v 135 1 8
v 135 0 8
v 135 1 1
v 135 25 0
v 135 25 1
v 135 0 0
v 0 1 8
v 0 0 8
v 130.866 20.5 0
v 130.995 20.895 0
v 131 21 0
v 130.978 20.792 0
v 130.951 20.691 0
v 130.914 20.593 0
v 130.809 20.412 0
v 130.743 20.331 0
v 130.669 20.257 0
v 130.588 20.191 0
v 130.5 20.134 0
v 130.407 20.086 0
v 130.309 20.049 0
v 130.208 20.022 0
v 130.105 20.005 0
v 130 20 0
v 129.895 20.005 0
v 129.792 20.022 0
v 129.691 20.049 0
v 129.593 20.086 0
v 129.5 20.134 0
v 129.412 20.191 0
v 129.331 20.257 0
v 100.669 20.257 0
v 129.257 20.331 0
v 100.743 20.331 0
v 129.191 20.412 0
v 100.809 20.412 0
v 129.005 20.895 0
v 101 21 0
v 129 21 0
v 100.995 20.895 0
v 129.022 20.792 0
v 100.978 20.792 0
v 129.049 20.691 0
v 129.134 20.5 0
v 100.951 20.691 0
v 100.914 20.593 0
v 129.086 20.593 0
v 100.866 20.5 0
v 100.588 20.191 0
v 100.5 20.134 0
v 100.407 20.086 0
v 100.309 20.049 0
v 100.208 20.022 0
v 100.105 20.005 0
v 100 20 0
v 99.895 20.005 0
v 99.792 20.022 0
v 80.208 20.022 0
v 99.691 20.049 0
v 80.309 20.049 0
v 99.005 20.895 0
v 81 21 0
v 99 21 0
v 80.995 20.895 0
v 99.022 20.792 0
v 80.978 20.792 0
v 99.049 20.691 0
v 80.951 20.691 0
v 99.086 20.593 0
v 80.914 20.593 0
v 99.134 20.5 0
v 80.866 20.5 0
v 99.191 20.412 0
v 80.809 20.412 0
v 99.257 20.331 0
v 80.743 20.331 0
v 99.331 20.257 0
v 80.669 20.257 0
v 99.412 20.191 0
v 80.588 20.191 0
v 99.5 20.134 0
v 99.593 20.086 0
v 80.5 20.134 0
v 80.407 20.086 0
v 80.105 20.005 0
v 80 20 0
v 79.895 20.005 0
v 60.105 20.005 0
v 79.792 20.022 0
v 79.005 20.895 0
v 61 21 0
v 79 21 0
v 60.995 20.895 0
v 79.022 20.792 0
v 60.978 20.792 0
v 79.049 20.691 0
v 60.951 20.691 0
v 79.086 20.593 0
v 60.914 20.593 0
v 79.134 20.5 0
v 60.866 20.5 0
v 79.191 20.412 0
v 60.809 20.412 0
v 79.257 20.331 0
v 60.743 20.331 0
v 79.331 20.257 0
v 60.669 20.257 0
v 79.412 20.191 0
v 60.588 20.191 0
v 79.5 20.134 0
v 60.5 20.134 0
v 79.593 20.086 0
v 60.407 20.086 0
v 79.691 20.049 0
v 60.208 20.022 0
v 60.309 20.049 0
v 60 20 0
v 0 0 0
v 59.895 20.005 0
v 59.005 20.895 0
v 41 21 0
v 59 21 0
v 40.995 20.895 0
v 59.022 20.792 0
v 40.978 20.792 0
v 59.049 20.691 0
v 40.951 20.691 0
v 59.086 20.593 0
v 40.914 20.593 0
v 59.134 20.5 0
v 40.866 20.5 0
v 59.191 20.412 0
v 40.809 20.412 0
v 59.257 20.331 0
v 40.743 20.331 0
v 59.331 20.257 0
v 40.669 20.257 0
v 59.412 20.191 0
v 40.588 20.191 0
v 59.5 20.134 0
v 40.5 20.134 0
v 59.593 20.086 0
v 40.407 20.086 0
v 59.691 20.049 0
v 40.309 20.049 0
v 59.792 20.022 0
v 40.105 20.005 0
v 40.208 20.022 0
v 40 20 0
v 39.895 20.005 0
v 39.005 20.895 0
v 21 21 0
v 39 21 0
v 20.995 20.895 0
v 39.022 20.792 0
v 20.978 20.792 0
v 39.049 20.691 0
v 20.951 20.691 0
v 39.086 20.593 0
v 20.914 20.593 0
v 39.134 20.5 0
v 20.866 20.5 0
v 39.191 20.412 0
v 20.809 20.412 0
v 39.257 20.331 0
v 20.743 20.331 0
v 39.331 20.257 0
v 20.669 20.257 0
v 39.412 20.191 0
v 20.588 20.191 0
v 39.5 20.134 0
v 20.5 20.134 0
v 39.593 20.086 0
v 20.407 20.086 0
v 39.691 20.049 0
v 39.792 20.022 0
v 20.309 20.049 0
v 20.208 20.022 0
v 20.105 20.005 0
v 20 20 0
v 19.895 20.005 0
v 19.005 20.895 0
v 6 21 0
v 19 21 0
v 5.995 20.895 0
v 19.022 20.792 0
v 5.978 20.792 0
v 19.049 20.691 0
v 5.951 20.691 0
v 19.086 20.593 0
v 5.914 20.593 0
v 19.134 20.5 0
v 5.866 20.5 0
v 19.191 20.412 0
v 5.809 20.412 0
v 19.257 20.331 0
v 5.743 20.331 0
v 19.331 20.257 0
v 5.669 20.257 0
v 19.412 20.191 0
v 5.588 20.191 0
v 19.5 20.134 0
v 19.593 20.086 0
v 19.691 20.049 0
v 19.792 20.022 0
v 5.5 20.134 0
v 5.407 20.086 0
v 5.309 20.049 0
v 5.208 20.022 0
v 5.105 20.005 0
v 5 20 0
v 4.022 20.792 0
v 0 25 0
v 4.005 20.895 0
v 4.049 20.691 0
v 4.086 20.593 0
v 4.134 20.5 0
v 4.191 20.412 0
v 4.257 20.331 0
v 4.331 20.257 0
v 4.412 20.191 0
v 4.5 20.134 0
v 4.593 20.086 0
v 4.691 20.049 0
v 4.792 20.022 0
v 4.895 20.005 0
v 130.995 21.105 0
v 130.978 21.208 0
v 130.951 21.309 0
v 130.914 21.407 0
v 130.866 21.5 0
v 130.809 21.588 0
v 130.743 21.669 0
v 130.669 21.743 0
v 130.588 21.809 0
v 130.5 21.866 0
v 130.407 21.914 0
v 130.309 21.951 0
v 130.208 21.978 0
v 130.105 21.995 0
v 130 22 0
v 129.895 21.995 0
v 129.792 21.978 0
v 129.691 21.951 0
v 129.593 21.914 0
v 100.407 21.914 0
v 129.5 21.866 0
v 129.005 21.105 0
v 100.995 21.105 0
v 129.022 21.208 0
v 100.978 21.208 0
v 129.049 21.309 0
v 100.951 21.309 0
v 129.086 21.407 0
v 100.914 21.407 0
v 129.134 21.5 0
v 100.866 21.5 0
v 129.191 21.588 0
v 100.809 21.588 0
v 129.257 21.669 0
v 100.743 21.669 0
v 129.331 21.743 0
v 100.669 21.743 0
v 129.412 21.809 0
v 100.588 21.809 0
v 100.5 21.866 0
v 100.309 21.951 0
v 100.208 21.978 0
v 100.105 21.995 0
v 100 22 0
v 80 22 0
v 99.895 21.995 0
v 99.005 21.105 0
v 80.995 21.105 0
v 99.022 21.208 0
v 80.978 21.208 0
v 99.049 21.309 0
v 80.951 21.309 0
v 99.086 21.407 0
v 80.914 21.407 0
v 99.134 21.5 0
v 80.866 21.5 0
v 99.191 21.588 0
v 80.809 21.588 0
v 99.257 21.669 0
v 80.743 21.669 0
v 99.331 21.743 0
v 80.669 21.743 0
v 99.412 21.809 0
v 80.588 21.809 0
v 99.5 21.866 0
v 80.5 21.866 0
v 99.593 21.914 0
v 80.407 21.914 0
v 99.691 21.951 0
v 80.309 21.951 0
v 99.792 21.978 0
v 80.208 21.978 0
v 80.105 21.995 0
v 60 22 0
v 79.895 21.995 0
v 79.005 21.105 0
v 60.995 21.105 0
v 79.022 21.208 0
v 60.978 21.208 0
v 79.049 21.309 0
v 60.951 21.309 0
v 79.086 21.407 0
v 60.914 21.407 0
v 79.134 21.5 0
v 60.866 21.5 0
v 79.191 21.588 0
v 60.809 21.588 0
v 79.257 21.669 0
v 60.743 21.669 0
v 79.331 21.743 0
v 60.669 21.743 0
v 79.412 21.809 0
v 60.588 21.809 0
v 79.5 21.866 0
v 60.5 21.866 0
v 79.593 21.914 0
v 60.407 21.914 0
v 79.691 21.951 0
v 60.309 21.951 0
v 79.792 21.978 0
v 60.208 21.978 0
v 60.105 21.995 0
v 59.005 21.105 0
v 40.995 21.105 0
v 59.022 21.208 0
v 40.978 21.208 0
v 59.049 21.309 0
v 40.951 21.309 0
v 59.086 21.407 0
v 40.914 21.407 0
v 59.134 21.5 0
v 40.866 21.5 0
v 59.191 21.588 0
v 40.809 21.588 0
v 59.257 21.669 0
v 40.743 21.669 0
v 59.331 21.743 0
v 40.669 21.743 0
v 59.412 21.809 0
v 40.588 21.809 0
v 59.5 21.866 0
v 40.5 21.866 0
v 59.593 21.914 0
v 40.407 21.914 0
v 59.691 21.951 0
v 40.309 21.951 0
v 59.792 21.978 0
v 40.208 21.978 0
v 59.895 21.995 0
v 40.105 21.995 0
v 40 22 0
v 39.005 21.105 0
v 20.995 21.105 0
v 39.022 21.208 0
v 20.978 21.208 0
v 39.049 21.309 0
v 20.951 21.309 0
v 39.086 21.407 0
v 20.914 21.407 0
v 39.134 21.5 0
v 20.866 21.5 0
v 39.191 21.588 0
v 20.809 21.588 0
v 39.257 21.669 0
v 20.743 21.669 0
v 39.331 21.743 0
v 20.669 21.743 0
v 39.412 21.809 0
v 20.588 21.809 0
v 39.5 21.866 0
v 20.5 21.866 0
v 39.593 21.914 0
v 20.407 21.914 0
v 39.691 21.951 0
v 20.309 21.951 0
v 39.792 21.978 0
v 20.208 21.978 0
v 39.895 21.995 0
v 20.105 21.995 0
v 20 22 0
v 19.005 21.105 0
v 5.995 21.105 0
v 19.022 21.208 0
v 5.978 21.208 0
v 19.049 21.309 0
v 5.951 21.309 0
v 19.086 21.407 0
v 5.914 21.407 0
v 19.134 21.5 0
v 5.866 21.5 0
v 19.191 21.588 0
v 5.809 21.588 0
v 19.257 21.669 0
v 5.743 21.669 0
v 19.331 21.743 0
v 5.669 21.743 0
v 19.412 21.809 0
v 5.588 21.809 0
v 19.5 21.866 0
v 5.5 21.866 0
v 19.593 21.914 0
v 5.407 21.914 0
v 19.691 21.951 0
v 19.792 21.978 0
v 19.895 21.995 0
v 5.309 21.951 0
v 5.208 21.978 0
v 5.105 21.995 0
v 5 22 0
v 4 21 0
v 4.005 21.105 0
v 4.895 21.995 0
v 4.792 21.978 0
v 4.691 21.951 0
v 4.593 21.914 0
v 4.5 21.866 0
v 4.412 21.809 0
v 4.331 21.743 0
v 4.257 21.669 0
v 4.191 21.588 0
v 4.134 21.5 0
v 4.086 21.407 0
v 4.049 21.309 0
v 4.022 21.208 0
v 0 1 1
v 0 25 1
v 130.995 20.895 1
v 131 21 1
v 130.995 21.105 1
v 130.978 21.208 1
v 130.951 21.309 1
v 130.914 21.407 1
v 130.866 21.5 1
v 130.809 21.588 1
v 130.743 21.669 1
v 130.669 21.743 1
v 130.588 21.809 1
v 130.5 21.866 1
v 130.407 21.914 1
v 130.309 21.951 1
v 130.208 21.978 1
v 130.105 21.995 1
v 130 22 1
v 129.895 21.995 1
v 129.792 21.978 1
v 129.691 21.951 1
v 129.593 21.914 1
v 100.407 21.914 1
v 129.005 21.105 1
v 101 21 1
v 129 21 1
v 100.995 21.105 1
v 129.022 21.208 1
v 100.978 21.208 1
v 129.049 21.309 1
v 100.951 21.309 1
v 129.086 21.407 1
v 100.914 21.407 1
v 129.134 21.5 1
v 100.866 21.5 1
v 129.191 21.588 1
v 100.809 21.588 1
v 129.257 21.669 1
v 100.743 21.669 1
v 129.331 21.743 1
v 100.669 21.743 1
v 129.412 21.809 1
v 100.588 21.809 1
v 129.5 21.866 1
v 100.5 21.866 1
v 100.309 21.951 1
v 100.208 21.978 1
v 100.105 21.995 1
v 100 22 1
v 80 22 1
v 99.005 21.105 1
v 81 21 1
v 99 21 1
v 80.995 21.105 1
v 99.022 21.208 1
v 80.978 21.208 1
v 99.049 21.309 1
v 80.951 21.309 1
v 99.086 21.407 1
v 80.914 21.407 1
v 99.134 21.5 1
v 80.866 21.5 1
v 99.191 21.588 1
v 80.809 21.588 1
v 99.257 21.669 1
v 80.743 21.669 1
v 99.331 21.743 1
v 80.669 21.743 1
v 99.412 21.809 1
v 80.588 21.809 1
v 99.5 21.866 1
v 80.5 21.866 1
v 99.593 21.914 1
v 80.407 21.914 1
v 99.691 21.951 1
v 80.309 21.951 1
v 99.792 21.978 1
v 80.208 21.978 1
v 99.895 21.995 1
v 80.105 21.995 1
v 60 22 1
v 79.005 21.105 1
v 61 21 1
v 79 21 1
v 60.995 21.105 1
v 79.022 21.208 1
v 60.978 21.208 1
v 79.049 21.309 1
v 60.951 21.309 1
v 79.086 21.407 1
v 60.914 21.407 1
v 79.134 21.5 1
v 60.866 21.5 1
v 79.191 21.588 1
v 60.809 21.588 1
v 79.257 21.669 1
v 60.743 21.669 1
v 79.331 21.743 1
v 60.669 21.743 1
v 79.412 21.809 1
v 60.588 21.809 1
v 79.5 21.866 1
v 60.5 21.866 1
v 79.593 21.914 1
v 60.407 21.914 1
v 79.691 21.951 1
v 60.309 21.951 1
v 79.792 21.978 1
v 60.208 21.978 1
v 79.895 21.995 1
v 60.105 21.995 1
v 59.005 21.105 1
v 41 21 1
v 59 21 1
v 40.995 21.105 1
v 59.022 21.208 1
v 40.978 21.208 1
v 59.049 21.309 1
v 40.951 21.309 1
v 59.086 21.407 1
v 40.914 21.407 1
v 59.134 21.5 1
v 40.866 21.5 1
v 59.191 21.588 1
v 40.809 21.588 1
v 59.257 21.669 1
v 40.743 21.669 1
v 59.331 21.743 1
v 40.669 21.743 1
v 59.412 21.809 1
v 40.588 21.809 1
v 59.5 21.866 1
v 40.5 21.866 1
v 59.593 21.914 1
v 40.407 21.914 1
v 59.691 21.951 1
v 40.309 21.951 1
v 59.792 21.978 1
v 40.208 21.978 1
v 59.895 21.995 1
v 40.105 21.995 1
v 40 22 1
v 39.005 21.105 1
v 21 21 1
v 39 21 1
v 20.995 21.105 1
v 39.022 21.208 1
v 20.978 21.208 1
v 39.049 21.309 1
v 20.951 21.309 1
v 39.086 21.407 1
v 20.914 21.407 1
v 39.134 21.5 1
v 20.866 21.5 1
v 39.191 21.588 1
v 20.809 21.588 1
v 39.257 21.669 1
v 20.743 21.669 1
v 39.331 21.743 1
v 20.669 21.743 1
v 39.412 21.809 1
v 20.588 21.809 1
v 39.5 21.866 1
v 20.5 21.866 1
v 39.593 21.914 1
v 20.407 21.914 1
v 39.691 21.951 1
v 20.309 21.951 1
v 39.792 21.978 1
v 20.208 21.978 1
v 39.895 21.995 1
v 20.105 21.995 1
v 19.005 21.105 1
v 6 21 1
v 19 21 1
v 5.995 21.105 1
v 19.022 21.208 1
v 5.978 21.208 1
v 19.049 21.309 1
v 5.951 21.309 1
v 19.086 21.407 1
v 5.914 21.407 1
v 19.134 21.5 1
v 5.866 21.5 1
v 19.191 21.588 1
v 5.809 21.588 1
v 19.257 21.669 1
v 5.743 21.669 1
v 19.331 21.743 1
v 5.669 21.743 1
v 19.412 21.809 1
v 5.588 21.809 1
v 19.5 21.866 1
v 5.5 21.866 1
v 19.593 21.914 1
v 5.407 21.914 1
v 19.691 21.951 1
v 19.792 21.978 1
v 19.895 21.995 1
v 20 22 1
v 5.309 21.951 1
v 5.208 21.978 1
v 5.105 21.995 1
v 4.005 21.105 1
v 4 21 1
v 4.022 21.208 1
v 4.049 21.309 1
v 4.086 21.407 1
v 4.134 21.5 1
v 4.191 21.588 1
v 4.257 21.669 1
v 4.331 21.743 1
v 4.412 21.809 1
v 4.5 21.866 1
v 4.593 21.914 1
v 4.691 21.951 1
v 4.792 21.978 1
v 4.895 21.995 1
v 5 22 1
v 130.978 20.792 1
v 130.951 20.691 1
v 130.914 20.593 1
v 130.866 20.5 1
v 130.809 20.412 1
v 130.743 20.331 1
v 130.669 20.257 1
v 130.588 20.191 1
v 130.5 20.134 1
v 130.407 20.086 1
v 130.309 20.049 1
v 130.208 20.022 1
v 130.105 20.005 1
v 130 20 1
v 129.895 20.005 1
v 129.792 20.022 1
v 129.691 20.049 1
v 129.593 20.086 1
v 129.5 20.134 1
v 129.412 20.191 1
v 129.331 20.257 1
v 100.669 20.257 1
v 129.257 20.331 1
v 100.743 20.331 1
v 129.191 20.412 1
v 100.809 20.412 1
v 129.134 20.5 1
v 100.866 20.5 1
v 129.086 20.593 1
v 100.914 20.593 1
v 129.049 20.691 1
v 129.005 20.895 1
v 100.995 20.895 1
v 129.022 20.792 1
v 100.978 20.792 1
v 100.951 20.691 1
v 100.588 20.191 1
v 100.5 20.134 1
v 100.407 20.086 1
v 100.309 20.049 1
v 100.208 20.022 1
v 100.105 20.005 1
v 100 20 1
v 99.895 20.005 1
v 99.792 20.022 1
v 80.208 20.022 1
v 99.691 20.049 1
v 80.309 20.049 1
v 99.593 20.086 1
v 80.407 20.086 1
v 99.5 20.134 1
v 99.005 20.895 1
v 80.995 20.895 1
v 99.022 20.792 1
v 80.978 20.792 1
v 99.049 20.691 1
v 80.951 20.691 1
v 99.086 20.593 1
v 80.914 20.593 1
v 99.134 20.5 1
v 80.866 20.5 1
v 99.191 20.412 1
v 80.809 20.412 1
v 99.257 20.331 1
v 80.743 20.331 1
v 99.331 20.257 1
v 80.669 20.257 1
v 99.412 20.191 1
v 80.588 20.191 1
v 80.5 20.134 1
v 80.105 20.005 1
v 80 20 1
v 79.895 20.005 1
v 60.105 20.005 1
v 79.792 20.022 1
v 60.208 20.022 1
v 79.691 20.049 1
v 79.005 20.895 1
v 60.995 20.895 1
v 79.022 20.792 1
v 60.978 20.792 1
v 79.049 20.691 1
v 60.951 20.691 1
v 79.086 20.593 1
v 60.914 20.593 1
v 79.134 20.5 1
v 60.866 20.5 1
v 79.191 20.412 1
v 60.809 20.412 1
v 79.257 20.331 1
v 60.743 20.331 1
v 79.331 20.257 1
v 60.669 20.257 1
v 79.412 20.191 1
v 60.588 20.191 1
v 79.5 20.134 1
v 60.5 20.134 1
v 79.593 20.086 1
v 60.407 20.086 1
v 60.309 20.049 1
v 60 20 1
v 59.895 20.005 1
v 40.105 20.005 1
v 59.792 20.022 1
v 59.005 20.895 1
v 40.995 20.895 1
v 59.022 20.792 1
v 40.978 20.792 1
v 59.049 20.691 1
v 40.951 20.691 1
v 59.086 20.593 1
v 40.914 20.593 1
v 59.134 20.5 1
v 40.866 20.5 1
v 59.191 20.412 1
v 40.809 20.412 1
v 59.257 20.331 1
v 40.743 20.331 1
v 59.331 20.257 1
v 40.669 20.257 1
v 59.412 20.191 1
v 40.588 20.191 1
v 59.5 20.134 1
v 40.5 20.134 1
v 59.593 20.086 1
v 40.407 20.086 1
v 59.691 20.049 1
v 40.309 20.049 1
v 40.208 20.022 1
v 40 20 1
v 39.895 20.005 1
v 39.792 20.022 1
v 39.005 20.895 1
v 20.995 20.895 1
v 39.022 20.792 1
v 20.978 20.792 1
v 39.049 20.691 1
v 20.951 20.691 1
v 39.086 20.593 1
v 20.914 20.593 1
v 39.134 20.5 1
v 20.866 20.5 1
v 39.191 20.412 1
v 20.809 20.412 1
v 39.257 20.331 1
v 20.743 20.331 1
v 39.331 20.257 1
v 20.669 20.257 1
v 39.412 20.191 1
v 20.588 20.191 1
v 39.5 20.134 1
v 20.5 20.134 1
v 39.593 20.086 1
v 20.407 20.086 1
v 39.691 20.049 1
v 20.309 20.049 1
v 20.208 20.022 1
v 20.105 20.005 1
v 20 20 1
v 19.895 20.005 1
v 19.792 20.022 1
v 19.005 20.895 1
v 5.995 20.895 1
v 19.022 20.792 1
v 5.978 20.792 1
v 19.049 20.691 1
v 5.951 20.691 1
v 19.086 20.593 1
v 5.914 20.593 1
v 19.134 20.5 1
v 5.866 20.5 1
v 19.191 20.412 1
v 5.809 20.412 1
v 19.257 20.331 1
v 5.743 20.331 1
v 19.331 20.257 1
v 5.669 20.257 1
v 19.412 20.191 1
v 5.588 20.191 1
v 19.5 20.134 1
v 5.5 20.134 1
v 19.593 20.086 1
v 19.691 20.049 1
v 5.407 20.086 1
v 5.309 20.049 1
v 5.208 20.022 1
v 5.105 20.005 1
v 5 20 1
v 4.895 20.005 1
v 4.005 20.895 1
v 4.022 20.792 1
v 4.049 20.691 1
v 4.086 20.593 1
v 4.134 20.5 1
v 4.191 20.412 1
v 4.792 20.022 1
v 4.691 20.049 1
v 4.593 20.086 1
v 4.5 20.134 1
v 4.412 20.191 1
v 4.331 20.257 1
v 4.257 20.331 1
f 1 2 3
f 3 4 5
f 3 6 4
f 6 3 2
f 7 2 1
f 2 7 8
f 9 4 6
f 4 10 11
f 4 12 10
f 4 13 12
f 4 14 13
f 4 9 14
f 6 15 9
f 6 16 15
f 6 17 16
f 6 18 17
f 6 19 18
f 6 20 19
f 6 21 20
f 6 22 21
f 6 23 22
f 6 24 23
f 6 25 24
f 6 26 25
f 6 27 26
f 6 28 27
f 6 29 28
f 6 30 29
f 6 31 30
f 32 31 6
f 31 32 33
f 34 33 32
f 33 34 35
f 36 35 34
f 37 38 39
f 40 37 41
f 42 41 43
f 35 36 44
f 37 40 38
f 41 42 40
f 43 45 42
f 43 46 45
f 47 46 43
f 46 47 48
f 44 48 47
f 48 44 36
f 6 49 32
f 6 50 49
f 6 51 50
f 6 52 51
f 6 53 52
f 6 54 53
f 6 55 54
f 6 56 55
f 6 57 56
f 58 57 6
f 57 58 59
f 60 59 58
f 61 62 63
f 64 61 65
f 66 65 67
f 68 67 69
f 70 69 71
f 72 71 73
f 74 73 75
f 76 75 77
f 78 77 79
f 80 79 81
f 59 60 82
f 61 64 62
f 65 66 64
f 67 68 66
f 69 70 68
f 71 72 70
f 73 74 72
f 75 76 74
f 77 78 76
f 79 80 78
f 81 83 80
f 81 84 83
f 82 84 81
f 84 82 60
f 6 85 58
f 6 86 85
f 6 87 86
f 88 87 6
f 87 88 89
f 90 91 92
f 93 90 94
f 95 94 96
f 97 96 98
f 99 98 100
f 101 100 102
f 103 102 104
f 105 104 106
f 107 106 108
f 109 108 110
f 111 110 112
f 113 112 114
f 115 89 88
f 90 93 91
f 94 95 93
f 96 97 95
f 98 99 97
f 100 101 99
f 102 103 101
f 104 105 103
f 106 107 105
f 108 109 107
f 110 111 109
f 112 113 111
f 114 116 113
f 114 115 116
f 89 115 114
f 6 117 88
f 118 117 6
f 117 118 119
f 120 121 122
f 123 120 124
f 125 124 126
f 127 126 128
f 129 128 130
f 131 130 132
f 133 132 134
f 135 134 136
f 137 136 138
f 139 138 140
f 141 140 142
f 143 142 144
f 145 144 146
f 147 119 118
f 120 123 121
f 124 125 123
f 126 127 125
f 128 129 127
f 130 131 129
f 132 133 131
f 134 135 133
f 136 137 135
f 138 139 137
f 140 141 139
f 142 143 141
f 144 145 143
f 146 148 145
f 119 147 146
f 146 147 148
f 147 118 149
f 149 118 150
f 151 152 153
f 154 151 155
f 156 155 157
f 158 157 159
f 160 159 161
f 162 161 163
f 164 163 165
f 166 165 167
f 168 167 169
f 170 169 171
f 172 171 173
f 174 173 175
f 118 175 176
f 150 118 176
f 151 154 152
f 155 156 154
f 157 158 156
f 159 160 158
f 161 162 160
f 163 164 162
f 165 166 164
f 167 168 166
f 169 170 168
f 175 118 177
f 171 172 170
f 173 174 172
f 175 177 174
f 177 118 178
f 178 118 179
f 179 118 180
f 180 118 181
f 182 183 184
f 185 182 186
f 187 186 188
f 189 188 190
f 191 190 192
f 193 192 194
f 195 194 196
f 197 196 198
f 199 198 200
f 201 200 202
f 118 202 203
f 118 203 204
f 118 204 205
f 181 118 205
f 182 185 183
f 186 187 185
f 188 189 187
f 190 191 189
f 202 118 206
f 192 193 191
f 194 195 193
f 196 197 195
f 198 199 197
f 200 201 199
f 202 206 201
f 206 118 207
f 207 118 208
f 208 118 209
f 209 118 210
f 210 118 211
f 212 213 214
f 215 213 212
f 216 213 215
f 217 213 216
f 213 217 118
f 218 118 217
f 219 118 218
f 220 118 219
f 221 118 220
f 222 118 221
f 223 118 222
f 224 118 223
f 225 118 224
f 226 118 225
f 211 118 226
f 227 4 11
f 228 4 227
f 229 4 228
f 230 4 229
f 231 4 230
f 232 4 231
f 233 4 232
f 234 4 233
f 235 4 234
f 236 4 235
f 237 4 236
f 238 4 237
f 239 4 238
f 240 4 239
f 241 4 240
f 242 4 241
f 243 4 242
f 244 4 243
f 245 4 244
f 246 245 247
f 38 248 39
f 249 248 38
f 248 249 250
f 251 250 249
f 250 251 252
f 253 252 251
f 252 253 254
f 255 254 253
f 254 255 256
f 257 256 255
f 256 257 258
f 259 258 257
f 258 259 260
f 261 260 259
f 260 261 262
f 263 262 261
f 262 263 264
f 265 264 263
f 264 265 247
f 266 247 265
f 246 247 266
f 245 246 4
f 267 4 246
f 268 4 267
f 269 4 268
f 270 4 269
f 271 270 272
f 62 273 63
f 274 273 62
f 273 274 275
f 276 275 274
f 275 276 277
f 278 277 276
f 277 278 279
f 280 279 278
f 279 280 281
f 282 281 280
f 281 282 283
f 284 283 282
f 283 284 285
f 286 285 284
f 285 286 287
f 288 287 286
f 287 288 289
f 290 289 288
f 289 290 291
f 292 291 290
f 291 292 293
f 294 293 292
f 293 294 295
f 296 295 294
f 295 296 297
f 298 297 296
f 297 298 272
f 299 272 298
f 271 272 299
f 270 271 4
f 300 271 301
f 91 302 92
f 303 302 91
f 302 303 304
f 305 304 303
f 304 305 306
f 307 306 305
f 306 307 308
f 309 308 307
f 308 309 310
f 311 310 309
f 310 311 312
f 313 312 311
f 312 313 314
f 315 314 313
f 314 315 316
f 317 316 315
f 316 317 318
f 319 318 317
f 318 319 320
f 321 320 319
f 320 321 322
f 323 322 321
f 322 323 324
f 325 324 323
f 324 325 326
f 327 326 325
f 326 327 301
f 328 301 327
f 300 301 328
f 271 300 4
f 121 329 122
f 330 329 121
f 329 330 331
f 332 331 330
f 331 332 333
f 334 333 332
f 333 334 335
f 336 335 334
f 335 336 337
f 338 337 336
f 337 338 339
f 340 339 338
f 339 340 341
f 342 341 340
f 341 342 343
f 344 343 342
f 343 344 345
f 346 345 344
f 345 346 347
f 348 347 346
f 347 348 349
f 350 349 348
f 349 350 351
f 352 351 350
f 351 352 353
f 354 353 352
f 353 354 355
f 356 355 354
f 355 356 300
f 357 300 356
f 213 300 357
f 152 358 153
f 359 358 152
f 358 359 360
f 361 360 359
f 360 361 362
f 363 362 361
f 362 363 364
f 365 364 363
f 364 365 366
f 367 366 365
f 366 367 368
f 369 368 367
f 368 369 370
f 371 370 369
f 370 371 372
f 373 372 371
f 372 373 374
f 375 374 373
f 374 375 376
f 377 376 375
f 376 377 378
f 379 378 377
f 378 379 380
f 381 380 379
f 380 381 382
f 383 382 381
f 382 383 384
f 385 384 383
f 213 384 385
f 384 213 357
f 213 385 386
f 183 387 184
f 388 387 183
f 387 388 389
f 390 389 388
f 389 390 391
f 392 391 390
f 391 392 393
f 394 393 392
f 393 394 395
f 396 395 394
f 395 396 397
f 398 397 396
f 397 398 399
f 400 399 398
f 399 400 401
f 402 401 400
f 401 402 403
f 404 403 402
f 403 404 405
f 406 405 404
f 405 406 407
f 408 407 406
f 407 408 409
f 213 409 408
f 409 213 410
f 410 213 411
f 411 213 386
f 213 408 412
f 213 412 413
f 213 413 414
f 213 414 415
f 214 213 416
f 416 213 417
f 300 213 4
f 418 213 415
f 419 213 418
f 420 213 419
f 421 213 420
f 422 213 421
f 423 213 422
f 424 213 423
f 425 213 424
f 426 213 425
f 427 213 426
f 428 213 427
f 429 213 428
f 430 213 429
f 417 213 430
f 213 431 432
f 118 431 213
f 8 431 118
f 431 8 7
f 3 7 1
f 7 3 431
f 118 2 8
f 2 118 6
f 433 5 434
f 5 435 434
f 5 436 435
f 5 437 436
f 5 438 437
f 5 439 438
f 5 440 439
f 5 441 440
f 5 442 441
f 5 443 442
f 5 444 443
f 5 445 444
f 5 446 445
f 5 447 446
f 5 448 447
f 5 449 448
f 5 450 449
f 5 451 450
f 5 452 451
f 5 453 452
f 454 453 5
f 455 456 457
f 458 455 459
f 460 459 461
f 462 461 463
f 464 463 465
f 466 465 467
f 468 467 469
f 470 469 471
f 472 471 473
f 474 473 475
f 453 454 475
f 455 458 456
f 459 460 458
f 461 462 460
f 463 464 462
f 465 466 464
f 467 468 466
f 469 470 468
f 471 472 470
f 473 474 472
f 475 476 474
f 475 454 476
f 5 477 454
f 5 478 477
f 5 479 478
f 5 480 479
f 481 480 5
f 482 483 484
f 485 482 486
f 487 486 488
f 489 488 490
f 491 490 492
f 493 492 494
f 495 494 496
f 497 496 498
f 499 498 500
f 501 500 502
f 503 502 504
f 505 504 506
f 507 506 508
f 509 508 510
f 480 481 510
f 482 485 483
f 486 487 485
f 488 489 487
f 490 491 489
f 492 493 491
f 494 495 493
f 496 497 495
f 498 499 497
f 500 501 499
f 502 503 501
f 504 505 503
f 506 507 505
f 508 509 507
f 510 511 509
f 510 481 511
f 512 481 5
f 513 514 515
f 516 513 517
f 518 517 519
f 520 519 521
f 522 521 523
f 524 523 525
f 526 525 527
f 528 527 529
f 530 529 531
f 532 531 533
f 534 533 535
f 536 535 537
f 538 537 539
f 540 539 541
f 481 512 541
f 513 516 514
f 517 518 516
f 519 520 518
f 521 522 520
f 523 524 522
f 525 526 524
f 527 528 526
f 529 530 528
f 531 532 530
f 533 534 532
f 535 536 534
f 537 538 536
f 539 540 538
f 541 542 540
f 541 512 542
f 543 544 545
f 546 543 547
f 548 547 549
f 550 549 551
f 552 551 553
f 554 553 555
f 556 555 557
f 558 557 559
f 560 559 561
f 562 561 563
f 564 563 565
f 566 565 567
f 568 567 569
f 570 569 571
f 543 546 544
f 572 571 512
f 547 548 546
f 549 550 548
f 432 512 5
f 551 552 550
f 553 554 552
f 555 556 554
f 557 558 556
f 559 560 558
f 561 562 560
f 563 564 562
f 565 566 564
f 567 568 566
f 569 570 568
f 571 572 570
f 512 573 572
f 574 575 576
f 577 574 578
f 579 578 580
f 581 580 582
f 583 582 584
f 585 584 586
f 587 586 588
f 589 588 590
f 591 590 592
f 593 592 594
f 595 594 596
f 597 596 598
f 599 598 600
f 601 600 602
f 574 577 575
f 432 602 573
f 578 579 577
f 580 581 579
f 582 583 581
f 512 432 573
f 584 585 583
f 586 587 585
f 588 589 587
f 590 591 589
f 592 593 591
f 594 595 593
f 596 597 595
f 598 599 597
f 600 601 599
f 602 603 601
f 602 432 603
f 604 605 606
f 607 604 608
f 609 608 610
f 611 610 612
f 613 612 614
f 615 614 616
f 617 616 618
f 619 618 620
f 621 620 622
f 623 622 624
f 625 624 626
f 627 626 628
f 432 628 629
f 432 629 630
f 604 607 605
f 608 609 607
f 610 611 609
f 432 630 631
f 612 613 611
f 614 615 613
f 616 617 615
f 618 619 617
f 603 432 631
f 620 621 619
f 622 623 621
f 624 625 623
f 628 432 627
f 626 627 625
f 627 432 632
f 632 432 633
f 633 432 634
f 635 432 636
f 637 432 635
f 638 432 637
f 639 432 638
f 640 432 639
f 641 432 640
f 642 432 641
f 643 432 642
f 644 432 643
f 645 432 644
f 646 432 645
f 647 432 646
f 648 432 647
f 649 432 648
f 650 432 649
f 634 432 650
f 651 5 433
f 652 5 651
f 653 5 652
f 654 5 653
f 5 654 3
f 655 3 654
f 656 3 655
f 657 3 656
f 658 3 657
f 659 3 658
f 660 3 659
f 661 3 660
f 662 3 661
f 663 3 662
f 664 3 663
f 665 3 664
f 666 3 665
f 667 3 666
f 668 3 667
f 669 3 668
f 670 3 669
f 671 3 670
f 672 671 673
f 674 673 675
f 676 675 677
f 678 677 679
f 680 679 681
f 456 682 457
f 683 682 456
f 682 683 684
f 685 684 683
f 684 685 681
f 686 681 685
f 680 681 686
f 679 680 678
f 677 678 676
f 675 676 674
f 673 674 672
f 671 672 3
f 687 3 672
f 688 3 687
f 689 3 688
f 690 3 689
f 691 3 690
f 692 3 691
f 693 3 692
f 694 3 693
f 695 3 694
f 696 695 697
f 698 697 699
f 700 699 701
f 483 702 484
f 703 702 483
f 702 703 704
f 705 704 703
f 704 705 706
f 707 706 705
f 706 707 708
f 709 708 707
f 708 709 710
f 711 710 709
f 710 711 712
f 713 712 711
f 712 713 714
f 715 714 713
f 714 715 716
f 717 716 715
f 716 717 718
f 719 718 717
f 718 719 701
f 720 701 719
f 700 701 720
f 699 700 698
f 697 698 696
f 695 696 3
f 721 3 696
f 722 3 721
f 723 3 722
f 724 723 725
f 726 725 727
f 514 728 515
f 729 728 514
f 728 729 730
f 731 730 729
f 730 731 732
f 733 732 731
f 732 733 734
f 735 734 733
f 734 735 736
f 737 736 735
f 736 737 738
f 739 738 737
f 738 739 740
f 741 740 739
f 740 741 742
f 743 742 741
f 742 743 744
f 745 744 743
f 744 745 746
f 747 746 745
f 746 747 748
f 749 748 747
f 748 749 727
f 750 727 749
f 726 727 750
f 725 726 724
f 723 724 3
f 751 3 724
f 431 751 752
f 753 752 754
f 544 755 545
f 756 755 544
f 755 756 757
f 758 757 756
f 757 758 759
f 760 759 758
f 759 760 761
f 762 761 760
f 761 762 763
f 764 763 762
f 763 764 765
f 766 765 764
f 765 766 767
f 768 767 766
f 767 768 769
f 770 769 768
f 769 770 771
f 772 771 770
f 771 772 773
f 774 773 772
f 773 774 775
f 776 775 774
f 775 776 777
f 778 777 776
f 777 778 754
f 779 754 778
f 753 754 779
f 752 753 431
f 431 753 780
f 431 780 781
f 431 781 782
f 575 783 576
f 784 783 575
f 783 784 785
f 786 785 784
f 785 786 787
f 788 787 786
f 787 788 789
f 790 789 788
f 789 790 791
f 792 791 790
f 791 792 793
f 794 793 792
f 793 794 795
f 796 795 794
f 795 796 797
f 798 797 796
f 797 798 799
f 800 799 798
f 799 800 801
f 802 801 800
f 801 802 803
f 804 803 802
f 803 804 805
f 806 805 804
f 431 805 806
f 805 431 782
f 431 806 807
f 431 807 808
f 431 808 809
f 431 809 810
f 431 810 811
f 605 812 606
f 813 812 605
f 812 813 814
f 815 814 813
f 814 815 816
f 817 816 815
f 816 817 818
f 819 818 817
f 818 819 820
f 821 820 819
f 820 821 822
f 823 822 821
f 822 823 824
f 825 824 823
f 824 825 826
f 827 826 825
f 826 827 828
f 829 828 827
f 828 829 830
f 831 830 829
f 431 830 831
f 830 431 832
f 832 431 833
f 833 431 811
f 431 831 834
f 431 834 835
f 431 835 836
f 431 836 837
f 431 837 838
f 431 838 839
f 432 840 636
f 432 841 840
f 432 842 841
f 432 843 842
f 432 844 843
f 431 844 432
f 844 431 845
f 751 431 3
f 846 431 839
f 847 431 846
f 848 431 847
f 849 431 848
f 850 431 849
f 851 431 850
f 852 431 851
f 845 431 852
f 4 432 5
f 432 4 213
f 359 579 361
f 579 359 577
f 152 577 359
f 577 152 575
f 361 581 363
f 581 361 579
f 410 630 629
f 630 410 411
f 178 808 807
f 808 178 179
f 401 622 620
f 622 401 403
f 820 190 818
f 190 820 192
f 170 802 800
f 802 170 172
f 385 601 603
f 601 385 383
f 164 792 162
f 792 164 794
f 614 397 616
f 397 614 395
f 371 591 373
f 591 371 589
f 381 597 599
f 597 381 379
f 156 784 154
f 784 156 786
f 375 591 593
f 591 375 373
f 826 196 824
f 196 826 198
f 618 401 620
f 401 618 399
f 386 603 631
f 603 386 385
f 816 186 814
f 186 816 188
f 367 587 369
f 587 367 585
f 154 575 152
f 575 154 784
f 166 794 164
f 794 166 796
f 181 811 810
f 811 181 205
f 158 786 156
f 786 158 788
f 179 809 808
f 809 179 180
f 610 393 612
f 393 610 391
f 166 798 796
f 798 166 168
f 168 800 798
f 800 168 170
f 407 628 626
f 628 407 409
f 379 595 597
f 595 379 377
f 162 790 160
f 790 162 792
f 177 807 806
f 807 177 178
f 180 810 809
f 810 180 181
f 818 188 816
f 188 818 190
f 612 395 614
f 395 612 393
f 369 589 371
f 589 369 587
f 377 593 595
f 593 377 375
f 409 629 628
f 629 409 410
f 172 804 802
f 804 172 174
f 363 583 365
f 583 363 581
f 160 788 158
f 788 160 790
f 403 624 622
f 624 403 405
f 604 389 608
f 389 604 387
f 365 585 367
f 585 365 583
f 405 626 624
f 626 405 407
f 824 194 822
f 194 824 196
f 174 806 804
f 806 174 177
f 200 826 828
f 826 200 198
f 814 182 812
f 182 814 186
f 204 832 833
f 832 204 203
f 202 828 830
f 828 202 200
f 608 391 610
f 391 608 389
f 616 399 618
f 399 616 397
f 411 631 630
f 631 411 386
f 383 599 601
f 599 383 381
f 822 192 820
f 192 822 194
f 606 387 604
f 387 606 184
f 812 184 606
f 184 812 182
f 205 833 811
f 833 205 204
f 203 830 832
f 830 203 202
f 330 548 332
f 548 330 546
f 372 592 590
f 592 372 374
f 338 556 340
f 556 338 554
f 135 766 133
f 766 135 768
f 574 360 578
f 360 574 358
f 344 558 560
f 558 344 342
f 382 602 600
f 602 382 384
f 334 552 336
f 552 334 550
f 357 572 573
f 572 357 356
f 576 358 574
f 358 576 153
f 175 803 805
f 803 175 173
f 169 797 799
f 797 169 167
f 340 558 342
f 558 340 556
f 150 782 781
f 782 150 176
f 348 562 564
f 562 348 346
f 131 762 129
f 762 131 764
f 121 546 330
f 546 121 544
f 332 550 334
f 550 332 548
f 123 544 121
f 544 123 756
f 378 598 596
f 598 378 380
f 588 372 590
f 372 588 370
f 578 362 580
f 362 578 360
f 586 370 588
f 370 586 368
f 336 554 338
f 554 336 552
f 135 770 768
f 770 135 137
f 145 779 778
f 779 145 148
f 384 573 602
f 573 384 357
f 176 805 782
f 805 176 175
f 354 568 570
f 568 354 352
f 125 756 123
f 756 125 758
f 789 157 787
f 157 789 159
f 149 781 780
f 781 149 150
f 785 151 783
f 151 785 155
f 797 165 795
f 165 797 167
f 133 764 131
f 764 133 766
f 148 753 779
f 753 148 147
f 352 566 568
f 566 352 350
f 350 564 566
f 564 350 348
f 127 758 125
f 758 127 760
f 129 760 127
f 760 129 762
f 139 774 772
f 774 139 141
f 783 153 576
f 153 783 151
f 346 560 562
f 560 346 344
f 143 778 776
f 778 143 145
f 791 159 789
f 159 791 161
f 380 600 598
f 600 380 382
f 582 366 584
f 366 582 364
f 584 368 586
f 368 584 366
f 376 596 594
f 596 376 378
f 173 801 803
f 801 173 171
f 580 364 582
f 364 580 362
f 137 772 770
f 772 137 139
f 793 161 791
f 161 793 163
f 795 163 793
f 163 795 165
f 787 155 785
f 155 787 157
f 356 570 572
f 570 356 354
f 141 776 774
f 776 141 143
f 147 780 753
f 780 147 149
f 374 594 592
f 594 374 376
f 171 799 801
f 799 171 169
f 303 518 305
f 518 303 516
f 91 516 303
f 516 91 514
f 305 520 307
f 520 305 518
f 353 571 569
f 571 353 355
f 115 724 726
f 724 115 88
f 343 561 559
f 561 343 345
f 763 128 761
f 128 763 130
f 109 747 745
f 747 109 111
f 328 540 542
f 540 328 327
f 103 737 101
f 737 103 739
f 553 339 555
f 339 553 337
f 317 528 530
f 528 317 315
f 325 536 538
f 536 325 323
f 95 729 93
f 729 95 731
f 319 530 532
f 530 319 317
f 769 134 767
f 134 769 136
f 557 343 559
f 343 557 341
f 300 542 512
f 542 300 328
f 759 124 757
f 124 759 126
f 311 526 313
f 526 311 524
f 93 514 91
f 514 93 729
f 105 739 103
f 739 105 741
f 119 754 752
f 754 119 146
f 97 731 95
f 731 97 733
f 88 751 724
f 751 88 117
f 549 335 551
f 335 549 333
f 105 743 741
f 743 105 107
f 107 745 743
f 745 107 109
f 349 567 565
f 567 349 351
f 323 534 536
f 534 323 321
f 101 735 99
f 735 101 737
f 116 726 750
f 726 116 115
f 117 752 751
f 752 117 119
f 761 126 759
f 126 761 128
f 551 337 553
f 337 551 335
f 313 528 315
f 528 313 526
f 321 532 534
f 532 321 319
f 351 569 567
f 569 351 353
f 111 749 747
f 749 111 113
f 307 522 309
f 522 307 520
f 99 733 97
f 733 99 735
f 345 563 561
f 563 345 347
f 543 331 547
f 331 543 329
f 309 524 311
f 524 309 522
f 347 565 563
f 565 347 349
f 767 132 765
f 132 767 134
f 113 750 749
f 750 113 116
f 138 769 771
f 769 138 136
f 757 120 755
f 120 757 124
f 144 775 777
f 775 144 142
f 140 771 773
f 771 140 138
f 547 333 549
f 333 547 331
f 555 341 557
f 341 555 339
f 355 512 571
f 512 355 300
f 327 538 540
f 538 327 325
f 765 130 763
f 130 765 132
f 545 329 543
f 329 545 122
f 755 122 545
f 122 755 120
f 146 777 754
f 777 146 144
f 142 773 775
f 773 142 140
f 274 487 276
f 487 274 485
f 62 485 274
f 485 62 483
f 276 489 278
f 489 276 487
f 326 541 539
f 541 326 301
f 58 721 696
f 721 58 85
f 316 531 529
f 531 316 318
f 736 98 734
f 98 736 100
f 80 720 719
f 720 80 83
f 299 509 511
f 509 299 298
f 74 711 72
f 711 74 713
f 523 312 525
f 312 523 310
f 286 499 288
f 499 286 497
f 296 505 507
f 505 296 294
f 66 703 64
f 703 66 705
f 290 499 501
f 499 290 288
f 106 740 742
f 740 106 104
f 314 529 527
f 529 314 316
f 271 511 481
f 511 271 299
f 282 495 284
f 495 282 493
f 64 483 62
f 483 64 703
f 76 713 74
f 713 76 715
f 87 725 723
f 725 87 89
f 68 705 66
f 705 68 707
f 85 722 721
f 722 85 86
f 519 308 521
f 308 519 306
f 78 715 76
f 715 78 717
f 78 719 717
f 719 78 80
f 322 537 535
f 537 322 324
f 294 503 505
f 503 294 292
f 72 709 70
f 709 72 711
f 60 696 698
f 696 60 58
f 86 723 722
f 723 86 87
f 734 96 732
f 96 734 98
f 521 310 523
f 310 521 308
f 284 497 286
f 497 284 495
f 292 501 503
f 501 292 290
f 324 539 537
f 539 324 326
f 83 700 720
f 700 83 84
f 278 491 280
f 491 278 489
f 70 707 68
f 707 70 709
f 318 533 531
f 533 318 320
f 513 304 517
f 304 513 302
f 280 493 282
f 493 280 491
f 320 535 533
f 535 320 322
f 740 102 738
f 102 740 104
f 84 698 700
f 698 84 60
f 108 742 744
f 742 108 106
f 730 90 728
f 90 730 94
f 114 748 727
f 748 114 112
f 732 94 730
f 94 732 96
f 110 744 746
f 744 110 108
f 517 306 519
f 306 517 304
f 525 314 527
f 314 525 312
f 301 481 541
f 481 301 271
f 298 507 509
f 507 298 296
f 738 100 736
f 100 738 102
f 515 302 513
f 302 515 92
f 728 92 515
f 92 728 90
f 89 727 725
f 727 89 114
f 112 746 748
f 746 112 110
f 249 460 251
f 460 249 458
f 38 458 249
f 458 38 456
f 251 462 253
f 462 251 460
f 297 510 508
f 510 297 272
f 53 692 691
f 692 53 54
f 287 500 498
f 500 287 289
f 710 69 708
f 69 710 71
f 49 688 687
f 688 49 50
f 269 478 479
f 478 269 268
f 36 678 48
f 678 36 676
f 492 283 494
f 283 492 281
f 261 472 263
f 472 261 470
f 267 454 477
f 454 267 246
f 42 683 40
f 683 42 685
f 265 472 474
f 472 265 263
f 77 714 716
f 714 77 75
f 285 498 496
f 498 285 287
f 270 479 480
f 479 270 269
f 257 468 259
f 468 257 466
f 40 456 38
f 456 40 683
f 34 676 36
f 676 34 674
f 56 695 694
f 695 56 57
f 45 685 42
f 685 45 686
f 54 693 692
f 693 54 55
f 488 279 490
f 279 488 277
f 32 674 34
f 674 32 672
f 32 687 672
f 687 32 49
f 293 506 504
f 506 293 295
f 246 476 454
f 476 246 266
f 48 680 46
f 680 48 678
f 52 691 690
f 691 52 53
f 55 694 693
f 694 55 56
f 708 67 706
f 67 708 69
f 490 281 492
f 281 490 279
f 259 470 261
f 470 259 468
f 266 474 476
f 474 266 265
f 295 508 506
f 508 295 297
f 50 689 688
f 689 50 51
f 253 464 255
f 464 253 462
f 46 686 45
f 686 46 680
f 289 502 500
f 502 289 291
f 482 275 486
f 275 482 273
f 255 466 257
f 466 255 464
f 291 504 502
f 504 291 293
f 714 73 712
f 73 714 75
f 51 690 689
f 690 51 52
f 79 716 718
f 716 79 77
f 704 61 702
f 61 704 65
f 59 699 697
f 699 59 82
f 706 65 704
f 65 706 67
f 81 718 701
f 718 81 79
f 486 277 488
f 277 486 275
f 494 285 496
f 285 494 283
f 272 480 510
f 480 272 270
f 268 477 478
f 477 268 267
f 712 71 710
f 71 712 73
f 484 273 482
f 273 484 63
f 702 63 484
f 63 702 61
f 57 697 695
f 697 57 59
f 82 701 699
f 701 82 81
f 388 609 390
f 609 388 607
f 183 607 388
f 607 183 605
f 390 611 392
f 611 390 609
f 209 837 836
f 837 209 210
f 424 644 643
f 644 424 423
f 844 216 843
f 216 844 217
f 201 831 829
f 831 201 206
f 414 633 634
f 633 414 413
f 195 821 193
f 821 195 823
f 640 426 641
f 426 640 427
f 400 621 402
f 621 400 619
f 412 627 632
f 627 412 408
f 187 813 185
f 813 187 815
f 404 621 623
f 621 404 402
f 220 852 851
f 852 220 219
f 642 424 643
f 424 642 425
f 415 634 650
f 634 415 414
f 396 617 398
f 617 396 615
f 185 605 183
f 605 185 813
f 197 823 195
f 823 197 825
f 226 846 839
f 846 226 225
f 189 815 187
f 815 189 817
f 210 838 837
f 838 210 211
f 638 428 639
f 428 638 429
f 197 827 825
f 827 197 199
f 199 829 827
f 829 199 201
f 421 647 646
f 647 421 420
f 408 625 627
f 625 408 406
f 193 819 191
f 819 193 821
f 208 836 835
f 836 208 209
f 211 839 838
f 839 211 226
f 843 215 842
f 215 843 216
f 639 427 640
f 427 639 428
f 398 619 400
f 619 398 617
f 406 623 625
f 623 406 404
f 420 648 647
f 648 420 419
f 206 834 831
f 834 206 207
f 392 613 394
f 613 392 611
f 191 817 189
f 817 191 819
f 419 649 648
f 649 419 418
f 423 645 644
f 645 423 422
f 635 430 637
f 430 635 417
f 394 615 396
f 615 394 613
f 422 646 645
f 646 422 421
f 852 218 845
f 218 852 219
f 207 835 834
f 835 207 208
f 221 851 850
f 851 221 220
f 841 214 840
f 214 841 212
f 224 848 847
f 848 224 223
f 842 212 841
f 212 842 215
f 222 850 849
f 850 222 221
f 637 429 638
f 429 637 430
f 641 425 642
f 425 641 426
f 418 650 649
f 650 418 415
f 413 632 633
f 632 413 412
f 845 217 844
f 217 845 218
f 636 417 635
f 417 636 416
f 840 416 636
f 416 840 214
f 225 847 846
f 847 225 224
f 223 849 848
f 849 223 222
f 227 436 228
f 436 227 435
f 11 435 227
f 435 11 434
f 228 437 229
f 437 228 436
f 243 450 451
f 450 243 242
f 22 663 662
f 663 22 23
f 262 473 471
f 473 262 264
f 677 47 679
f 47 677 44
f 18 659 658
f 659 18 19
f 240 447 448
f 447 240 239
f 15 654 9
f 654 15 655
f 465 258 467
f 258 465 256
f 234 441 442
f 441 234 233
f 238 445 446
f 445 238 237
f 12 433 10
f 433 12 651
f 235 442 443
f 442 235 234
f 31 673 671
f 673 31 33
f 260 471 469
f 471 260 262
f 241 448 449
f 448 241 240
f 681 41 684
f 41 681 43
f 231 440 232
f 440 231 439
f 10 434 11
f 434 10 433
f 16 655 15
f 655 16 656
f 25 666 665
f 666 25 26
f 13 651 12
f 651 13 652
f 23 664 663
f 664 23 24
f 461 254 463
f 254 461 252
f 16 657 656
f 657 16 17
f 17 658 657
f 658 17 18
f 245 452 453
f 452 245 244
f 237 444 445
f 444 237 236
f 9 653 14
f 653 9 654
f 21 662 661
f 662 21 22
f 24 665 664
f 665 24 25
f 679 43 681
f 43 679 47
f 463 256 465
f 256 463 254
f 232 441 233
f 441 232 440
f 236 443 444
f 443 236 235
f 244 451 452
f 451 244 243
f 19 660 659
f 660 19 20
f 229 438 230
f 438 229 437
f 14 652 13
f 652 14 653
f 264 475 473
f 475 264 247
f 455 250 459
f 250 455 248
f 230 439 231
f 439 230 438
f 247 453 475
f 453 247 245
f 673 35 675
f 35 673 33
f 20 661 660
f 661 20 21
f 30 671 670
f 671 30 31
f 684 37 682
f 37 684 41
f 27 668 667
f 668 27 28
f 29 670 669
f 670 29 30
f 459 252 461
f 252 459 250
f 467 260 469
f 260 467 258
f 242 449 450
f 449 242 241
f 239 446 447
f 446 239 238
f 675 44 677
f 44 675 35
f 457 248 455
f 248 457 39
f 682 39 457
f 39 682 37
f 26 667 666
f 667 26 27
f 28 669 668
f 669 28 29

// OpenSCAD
//6.5mm deep
//23mm to hole
//
$fn=60;
length=135;
difference() {
    union() {
        cube([length,1,8]);
        cube([length,25,1]);
    }
    translate([5,21,-5]) cylinder(d=2,h=10);
    if (length > 20) {
        for(i=[1:floor(length/20)-1]) {
            translate([20*i,21,-5]) cylinder(d=2,h=10);
        }
    }
    translate([length-5,21,-5]) cylinder(d=2,h=10);
}
